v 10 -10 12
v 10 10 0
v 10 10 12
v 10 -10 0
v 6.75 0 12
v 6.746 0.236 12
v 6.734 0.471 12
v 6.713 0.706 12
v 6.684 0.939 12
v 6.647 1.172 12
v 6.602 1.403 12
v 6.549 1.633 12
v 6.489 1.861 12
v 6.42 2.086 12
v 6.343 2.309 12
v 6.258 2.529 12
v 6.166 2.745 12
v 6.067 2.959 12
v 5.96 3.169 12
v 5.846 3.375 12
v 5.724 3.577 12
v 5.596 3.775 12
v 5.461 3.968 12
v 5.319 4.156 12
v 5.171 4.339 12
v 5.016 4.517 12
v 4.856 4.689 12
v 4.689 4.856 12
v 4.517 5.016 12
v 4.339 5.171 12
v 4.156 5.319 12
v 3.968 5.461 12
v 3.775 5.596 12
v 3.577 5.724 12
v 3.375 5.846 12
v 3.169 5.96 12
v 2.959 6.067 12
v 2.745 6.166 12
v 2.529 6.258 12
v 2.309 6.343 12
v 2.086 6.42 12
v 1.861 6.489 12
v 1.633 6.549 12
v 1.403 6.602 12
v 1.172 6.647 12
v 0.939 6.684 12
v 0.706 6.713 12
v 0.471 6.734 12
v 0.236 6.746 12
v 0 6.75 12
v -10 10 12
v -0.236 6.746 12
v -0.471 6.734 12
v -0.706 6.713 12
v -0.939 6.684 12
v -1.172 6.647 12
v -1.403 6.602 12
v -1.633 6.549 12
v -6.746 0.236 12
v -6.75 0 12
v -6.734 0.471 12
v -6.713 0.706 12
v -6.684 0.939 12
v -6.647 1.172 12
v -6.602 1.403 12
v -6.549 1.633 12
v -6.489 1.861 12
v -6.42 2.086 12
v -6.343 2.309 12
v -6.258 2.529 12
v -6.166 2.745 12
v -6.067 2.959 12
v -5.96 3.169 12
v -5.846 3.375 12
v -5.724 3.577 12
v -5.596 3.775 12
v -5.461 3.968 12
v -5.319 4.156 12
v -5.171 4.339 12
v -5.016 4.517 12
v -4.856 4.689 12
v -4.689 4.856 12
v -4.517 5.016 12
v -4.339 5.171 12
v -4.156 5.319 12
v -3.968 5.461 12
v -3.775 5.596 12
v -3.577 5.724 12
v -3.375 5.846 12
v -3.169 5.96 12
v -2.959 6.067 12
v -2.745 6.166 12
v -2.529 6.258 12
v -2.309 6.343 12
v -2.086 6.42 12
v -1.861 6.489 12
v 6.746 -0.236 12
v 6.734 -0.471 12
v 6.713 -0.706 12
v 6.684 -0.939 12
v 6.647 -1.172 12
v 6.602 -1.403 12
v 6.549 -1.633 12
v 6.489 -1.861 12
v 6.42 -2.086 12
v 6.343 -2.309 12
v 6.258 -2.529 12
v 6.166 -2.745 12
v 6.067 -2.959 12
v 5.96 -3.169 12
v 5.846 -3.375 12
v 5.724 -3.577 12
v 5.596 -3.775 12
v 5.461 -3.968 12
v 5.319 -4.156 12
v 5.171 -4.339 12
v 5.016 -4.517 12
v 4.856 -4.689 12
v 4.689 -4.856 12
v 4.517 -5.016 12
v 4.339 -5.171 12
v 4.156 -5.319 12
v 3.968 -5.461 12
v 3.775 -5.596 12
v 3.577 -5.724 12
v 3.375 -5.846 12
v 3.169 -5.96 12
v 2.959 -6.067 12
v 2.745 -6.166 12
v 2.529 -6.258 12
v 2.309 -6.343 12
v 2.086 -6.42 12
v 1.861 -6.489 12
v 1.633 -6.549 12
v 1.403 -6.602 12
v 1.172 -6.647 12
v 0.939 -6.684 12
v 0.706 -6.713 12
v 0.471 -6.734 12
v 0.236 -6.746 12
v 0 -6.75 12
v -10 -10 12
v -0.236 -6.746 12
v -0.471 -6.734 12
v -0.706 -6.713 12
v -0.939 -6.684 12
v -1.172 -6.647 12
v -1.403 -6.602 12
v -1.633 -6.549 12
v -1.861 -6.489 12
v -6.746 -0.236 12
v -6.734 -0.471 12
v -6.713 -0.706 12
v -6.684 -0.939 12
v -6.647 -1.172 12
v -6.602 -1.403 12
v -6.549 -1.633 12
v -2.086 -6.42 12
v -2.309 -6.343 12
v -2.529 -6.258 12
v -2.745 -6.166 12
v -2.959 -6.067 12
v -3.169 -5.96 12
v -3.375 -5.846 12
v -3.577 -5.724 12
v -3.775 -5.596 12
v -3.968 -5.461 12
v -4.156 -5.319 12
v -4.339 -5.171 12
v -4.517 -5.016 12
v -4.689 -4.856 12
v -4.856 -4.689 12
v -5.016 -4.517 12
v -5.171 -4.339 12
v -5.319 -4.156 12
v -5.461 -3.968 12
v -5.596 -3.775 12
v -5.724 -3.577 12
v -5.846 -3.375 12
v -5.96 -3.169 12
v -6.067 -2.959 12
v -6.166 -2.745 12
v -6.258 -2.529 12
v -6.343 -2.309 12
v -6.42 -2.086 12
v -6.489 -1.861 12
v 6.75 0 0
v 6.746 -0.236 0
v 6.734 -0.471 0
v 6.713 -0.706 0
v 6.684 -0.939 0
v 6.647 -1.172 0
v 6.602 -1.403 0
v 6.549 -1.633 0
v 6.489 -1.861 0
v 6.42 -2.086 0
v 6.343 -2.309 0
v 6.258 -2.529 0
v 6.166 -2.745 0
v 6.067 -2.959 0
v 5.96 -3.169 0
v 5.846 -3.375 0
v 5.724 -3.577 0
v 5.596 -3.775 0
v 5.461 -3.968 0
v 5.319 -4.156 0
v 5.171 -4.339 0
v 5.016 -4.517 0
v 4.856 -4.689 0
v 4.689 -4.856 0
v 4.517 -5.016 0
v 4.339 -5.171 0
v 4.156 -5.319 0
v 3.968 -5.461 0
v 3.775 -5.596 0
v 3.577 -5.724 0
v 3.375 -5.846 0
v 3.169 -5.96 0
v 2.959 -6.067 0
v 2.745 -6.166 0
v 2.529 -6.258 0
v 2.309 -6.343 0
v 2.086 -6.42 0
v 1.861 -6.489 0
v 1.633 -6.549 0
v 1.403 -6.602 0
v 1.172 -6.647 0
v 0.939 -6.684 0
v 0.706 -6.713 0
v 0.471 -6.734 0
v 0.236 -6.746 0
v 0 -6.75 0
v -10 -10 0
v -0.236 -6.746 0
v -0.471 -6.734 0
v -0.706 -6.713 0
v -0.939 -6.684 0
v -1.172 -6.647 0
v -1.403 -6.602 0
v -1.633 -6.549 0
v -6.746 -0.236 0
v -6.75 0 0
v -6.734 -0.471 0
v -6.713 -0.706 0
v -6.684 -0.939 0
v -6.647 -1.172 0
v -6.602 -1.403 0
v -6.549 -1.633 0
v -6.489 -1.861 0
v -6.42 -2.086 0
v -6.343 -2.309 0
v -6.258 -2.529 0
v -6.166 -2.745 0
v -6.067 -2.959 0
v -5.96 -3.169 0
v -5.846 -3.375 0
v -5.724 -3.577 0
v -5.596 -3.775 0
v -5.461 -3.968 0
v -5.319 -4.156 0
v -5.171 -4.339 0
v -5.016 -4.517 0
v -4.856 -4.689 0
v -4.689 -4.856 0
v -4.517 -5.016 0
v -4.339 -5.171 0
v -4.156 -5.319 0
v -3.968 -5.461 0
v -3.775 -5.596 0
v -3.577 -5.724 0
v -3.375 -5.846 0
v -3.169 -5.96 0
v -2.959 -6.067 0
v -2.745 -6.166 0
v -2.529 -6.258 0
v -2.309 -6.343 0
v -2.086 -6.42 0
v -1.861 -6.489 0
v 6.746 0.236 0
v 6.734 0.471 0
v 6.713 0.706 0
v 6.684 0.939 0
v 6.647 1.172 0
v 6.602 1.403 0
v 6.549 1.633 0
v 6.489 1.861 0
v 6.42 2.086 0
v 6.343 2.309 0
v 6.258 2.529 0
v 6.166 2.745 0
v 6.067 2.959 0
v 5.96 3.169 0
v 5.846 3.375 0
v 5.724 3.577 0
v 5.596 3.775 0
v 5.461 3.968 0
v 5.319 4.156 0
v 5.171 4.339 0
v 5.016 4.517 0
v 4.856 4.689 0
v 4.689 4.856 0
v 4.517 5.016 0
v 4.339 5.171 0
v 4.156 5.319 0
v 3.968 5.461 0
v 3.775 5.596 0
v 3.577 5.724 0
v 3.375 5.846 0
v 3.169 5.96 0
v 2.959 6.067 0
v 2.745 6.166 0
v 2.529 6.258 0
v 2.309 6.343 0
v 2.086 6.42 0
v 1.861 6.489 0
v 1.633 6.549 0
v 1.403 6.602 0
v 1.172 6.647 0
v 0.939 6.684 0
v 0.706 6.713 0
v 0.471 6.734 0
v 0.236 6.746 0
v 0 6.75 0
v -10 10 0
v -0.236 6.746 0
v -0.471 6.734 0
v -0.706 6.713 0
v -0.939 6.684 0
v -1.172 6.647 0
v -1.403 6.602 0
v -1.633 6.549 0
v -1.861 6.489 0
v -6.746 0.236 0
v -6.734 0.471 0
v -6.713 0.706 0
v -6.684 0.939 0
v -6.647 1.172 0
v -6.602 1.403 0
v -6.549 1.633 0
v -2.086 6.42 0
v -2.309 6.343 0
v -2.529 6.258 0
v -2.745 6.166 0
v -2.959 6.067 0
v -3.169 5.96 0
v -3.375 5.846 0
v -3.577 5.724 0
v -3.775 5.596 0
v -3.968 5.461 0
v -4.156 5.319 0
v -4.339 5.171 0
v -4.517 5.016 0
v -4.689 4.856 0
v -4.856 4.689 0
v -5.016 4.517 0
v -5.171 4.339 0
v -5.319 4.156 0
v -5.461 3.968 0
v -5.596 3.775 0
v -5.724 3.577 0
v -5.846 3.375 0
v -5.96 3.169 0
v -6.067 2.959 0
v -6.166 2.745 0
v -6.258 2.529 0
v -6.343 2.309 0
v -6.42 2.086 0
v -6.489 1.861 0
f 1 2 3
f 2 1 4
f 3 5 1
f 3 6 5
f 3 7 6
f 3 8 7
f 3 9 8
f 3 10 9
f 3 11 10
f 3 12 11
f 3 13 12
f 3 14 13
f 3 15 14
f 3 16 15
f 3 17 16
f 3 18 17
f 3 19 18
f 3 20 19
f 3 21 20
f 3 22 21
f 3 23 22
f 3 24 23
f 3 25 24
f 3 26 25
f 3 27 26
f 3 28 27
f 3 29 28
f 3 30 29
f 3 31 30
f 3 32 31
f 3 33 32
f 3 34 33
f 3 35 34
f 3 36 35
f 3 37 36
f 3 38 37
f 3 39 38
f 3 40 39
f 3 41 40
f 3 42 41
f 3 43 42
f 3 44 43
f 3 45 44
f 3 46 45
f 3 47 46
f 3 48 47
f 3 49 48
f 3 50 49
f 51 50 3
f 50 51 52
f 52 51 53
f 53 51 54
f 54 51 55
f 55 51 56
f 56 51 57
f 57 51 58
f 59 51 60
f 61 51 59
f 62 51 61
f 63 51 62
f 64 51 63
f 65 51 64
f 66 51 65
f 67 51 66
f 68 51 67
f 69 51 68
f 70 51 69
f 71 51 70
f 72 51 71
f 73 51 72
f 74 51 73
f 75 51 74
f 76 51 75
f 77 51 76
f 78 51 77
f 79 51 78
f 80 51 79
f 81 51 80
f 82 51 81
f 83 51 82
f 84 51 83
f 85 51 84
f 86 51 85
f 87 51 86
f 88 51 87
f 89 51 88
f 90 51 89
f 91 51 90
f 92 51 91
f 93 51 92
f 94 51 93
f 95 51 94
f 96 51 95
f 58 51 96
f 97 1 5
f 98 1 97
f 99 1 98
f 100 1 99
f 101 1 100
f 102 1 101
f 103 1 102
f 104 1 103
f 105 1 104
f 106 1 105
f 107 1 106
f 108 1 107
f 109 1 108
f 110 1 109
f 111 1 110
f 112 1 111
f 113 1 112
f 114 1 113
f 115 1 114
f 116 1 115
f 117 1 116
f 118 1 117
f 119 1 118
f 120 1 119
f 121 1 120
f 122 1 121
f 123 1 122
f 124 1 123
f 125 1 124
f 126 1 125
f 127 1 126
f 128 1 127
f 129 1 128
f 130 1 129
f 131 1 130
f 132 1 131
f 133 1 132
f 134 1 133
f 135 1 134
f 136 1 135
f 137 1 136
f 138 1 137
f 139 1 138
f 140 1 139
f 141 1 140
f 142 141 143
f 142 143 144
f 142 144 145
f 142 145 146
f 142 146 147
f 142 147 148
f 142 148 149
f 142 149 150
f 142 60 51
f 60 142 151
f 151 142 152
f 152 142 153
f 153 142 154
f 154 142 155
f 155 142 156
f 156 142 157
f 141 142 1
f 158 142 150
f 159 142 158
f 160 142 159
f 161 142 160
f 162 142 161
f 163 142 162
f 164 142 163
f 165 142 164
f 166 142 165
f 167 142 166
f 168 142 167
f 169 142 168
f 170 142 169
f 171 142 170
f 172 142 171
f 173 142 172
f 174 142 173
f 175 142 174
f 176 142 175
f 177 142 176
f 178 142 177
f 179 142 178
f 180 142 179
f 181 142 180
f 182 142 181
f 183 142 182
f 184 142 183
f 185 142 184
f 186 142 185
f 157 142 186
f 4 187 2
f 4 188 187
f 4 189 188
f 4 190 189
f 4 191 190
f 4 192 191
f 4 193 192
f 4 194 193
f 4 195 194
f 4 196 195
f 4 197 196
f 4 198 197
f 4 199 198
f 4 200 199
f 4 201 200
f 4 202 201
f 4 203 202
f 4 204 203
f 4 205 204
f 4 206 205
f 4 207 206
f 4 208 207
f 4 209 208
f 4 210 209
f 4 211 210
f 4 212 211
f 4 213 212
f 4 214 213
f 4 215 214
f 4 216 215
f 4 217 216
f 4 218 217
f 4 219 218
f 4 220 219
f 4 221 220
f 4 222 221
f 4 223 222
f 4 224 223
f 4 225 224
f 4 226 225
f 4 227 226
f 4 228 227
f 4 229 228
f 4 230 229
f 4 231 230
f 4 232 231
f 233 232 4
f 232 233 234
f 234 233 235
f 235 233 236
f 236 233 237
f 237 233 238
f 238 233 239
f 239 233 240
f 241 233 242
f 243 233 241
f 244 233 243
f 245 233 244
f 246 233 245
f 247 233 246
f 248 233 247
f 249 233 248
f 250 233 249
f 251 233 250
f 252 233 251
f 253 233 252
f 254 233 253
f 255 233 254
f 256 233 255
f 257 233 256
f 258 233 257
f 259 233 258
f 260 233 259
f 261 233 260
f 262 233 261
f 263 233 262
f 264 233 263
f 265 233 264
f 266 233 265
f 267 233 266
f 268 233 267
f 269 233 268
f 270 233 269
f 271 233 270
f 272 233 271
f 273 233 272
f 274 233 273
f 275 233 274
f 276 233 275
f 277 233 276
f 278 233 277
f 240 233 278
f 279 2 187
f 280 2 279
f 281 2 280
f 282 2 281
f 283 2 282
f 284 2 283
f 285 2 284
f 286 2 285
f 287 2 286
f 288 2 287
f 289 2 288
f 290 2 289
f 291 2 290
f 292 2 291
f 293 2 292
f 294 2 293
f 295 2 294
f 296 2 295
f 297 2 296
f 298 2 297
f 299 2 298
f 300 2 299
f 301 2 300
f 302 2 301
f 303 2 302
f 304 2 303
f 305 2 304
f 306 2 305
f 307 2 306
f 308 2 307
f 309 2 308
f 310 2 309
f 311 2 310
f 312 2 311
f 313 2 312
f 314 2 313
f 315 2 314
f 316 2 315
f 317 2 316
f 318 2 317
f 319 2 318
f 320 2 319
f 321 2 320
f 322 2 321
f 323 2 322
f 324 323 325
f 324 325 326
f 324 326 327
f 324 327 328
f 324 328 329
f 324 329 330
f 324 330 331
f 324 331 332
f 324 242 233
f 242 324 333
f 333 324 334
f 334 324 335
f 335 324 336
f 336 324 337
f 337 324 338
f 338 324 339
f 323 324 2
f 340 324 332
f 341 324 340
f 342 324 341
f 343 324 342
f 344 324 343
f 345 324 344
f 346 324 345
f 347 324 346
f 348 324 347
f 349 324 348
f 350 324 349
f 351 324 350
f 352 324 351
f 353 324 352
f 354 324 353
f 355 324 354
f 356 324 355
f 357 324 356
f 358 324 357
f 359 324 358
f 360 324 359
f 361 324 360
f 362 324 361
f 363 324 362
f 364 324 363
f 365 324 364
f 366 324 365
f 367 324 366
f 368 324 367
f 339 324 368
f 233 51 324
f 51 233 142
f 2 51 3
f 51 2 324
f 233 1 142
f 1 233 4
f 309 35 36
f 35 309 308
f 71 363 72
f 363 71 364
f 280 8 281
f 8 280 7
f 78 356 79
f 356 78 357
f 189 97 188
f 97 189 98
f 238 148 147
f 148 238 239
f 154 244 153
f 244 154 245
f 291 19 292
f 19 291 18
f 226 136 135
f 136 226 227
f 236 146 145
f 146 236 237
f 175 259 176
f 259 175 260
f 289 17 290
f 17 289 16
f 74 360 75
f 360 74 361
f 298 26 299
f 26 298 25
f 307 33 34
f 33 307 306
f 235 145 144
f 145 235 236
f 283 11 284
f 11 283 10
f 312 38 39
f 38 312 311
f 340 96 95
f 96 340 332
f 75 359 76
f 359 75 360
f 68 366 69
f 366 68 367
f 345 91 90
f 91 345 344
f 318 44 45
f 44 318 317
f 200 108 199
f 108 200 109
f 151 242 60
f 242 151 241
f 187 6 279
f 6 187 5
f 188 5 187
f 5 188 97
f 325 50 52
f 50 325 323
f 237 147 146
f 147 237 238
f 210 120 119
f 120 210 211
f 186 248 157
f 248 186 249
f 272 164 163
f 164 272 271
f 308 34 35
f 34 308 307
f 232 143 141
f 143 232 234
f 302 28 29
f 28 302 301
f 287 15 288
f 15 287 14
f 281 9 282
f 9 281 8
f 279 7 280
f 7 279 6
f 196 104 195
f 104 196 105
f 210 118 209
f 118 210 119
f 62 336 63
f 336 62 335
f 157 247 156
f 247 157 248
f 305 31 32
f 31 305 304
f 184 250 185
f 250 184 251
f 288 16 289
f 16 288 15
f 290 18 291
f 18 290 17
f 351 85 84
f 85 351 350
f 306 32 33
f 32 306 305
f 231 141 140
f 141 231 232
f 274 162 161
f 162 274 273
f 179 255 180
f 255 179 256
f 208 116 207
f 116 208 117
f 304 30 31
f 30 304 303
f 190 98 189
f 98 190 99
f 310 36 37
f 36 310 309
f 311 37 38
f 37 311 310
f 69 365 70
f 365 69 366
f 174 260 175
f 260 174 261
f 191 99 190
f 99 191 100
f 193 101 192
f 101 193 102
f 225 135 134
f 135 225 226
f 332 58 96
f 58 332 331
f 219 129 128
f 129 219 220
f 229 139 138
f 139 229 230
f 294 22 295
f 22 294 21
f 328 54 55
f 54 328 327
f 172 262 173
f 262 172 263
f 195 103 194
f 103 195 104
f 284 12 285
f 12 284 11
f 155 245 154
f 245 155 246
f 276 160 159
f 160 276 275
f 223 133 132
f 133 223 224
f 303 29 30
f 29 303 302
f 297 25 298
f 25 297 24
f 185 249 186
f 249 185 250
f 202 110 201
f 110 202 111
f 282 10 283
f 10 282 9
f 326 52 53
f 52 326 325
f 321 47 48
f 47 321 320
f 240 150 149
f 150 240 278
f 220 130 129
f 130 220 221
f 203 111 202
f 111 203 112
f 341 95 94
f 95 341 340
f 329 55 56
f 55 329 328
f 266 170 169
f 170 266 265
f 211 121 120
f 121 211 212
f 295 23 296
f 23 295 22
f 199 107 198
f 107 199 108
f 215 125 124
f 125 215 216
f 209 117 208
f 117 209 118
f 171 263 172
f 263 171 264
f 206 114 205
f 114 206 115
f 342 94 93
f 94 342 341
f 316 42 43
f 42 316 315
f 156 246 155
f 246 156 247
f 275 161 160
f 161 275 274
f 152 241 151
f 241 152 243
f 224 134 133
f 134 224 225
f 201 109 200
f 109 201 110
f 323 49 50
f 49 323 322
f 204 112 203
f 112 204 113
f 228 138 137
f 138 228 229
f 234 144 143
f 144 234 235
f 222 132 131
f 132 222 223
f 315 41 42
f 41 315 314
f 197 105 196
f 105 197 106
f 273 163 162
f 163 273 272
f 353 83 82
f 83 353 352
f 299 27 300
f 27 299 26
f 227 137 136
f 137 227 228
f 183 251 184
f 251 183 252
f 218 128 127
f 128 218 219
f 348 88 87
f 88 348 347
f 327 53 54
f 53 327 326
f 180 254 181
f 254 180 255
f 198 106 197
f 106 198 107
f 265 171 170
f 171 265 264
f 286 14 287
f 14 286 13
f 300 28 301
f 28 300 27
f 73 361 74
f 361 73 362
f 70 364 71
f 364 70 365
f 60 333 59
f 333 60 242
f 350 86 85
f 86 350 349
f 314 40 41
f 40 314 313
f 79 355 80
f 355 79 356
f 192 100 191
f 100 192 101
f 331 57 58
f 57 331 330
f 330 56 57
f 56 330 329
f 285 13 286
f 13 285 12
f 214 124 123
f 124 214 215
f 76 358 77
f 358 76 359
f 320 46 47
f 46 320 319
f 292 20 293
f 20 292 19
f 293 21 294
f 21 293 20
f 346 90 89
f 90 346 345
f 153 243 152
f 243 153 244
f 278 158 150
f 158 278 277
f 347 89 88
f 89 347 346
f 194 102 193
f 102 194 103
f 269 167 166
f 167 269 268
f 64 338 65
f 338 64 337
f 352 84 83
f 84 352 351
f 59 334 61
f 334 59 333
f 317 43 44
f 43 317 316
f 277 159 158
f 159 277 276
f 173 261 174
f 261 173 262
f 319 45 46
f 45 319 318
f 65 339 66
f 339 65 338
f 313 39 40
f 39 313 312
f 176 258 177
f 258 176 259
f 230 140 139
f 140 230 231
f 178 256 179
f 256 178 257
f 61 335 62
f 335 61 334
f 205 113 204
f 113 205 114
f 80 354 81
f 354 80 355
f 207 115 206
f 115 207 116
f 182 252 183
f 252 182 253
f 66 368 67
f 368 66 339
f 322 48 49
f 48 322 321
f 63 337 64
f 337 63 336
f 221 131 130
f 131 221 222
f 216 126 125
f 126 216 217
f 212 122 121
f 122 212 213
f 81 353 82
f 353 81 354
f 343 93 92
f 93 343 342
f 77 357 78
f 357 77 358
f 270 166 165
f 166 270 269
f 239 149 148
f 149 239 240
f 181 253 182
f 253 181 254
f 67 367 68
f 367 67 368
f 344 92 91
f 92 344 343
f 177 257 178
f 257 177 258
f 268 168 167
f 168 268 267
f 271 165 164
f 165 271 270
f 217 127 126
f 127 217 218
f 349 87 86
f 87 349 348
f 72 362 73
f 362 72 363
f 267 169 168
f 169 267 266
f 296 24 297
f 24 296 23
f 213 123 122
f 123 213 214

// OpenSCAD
// file: ../docs/helix_groove.scad
// A thread groove cut into a bore wall, along +Z: subtract it from the part.
// Single start; right hand climbs as the angle grows (counter-clockwise seen
// from +Z). The arguments map onto `extract_geometry.py thread` output:
//   pitch   lead
//   r_in    a little below minor_radius, so the flanks start in the bore's air
//   r_out   major_radius
//   root    root_flat: the groove's width at r_out
//   flank   flank_axial / depth: axial run per mm of radius (1 = 45 deg flank)
//   z0      the groove's centre on the +X ray: crest_center_at_0deg + pitch / 2
//   z_from, z_to  where the groove is cut
// Rotate or multmatrix the result onto the bore's axis; a pure rotation keeps
// the polyhedron's winding, a mirror is fine too (OpenSCAD fixes it).
module helix_groove(pitch, r_in, r_out, root, flank, z0, z_from, z_to, left = false, n = 120) {
    if (left) mirror([0, 1, 0]) helix_groove(pitch, r_in, r_out, root, flank, z0, z_from, z_to, false, n);
    else {
        hw_out = root / 2;
        hw_in = hw_out + flank * (r_out - r_in);
        turns0 = floor((z_from - z0) / pitch) - 1;
        turns1 = ceil((z_to - z0) / pitch) + 1;
        steps = (turns1 - turns0) * n;
        prof = [[r_in, -hw_in], [r_out, -hw_out], [r_out, hw_out], [r_in, hw_in]];
        pts = [for (i = [0 : steps]) let(a = 360 * i / n, z = z0 + pitch * (turns0 + i / n))
                  for (p = prof) [p[0] * cos(a), p[0] * sin(a), z + p[1]]];
        // polyhedron() wants every face clockwise seen from outside; the other way
        // round renders inside out (volume off by the groove's, not watertight)
        faces = concat(
            [[3, 2, 1, 0]],
            [for (i = [0 : steps - 1]) for (j = [0 : 3])
                let(a = 4 * i + j, b = 4 * i + (j + 1) % 4) [b, b + 4, a + 4, a]],
            [[4 * steps, 4 * steps + 1, 4 * steps + 2, 4 * steps + 3]]);
        intersection() {
            polyhedron(pts, faces);
            translate([-r_out - 1, -r_out - 1, z_from]) cube([2 * r_out + 2, 2 * r_out + 2, z_to - z_from]);
        }
    }
}
// main file
// A block with a threaded bore along +Z through (0, 0): known answers for
// `thread` (pitch 3.125, minor 6.75, major 7.15, groove centre at z 5.44375 on +X).
use <../docs/helix_groove.scad>

oct = false;     // octagonal bore with a slot out to +Y, instead of a round one
left = false;    // left-hand thread
threaded = true; // false: a plain bore

$fn = 180;

difference() {
    translate([-10, -10, 0]) cube([20, 20, 12]);
    translate([0, 0, -1]) {
        if (oct) linear_extrude(14) intersection() {
            square(13.5, center = true);
            rotate(45) square(13.5, center = true);
        }
        else cylinder(r = 6.75, h = 14);
        if (oct) translate([-4, 0, 0]) cube([8, 11, 14]);
    }
    if (threaded)
        helix_groove(pitch = 3.125, r_in = 6.4, r_out = 7.15, root = 0.625, flank = 0.41667 / 0.4,
                     z0 = 5.44375, z_from = -1, z_to = 13, left = left);
}
